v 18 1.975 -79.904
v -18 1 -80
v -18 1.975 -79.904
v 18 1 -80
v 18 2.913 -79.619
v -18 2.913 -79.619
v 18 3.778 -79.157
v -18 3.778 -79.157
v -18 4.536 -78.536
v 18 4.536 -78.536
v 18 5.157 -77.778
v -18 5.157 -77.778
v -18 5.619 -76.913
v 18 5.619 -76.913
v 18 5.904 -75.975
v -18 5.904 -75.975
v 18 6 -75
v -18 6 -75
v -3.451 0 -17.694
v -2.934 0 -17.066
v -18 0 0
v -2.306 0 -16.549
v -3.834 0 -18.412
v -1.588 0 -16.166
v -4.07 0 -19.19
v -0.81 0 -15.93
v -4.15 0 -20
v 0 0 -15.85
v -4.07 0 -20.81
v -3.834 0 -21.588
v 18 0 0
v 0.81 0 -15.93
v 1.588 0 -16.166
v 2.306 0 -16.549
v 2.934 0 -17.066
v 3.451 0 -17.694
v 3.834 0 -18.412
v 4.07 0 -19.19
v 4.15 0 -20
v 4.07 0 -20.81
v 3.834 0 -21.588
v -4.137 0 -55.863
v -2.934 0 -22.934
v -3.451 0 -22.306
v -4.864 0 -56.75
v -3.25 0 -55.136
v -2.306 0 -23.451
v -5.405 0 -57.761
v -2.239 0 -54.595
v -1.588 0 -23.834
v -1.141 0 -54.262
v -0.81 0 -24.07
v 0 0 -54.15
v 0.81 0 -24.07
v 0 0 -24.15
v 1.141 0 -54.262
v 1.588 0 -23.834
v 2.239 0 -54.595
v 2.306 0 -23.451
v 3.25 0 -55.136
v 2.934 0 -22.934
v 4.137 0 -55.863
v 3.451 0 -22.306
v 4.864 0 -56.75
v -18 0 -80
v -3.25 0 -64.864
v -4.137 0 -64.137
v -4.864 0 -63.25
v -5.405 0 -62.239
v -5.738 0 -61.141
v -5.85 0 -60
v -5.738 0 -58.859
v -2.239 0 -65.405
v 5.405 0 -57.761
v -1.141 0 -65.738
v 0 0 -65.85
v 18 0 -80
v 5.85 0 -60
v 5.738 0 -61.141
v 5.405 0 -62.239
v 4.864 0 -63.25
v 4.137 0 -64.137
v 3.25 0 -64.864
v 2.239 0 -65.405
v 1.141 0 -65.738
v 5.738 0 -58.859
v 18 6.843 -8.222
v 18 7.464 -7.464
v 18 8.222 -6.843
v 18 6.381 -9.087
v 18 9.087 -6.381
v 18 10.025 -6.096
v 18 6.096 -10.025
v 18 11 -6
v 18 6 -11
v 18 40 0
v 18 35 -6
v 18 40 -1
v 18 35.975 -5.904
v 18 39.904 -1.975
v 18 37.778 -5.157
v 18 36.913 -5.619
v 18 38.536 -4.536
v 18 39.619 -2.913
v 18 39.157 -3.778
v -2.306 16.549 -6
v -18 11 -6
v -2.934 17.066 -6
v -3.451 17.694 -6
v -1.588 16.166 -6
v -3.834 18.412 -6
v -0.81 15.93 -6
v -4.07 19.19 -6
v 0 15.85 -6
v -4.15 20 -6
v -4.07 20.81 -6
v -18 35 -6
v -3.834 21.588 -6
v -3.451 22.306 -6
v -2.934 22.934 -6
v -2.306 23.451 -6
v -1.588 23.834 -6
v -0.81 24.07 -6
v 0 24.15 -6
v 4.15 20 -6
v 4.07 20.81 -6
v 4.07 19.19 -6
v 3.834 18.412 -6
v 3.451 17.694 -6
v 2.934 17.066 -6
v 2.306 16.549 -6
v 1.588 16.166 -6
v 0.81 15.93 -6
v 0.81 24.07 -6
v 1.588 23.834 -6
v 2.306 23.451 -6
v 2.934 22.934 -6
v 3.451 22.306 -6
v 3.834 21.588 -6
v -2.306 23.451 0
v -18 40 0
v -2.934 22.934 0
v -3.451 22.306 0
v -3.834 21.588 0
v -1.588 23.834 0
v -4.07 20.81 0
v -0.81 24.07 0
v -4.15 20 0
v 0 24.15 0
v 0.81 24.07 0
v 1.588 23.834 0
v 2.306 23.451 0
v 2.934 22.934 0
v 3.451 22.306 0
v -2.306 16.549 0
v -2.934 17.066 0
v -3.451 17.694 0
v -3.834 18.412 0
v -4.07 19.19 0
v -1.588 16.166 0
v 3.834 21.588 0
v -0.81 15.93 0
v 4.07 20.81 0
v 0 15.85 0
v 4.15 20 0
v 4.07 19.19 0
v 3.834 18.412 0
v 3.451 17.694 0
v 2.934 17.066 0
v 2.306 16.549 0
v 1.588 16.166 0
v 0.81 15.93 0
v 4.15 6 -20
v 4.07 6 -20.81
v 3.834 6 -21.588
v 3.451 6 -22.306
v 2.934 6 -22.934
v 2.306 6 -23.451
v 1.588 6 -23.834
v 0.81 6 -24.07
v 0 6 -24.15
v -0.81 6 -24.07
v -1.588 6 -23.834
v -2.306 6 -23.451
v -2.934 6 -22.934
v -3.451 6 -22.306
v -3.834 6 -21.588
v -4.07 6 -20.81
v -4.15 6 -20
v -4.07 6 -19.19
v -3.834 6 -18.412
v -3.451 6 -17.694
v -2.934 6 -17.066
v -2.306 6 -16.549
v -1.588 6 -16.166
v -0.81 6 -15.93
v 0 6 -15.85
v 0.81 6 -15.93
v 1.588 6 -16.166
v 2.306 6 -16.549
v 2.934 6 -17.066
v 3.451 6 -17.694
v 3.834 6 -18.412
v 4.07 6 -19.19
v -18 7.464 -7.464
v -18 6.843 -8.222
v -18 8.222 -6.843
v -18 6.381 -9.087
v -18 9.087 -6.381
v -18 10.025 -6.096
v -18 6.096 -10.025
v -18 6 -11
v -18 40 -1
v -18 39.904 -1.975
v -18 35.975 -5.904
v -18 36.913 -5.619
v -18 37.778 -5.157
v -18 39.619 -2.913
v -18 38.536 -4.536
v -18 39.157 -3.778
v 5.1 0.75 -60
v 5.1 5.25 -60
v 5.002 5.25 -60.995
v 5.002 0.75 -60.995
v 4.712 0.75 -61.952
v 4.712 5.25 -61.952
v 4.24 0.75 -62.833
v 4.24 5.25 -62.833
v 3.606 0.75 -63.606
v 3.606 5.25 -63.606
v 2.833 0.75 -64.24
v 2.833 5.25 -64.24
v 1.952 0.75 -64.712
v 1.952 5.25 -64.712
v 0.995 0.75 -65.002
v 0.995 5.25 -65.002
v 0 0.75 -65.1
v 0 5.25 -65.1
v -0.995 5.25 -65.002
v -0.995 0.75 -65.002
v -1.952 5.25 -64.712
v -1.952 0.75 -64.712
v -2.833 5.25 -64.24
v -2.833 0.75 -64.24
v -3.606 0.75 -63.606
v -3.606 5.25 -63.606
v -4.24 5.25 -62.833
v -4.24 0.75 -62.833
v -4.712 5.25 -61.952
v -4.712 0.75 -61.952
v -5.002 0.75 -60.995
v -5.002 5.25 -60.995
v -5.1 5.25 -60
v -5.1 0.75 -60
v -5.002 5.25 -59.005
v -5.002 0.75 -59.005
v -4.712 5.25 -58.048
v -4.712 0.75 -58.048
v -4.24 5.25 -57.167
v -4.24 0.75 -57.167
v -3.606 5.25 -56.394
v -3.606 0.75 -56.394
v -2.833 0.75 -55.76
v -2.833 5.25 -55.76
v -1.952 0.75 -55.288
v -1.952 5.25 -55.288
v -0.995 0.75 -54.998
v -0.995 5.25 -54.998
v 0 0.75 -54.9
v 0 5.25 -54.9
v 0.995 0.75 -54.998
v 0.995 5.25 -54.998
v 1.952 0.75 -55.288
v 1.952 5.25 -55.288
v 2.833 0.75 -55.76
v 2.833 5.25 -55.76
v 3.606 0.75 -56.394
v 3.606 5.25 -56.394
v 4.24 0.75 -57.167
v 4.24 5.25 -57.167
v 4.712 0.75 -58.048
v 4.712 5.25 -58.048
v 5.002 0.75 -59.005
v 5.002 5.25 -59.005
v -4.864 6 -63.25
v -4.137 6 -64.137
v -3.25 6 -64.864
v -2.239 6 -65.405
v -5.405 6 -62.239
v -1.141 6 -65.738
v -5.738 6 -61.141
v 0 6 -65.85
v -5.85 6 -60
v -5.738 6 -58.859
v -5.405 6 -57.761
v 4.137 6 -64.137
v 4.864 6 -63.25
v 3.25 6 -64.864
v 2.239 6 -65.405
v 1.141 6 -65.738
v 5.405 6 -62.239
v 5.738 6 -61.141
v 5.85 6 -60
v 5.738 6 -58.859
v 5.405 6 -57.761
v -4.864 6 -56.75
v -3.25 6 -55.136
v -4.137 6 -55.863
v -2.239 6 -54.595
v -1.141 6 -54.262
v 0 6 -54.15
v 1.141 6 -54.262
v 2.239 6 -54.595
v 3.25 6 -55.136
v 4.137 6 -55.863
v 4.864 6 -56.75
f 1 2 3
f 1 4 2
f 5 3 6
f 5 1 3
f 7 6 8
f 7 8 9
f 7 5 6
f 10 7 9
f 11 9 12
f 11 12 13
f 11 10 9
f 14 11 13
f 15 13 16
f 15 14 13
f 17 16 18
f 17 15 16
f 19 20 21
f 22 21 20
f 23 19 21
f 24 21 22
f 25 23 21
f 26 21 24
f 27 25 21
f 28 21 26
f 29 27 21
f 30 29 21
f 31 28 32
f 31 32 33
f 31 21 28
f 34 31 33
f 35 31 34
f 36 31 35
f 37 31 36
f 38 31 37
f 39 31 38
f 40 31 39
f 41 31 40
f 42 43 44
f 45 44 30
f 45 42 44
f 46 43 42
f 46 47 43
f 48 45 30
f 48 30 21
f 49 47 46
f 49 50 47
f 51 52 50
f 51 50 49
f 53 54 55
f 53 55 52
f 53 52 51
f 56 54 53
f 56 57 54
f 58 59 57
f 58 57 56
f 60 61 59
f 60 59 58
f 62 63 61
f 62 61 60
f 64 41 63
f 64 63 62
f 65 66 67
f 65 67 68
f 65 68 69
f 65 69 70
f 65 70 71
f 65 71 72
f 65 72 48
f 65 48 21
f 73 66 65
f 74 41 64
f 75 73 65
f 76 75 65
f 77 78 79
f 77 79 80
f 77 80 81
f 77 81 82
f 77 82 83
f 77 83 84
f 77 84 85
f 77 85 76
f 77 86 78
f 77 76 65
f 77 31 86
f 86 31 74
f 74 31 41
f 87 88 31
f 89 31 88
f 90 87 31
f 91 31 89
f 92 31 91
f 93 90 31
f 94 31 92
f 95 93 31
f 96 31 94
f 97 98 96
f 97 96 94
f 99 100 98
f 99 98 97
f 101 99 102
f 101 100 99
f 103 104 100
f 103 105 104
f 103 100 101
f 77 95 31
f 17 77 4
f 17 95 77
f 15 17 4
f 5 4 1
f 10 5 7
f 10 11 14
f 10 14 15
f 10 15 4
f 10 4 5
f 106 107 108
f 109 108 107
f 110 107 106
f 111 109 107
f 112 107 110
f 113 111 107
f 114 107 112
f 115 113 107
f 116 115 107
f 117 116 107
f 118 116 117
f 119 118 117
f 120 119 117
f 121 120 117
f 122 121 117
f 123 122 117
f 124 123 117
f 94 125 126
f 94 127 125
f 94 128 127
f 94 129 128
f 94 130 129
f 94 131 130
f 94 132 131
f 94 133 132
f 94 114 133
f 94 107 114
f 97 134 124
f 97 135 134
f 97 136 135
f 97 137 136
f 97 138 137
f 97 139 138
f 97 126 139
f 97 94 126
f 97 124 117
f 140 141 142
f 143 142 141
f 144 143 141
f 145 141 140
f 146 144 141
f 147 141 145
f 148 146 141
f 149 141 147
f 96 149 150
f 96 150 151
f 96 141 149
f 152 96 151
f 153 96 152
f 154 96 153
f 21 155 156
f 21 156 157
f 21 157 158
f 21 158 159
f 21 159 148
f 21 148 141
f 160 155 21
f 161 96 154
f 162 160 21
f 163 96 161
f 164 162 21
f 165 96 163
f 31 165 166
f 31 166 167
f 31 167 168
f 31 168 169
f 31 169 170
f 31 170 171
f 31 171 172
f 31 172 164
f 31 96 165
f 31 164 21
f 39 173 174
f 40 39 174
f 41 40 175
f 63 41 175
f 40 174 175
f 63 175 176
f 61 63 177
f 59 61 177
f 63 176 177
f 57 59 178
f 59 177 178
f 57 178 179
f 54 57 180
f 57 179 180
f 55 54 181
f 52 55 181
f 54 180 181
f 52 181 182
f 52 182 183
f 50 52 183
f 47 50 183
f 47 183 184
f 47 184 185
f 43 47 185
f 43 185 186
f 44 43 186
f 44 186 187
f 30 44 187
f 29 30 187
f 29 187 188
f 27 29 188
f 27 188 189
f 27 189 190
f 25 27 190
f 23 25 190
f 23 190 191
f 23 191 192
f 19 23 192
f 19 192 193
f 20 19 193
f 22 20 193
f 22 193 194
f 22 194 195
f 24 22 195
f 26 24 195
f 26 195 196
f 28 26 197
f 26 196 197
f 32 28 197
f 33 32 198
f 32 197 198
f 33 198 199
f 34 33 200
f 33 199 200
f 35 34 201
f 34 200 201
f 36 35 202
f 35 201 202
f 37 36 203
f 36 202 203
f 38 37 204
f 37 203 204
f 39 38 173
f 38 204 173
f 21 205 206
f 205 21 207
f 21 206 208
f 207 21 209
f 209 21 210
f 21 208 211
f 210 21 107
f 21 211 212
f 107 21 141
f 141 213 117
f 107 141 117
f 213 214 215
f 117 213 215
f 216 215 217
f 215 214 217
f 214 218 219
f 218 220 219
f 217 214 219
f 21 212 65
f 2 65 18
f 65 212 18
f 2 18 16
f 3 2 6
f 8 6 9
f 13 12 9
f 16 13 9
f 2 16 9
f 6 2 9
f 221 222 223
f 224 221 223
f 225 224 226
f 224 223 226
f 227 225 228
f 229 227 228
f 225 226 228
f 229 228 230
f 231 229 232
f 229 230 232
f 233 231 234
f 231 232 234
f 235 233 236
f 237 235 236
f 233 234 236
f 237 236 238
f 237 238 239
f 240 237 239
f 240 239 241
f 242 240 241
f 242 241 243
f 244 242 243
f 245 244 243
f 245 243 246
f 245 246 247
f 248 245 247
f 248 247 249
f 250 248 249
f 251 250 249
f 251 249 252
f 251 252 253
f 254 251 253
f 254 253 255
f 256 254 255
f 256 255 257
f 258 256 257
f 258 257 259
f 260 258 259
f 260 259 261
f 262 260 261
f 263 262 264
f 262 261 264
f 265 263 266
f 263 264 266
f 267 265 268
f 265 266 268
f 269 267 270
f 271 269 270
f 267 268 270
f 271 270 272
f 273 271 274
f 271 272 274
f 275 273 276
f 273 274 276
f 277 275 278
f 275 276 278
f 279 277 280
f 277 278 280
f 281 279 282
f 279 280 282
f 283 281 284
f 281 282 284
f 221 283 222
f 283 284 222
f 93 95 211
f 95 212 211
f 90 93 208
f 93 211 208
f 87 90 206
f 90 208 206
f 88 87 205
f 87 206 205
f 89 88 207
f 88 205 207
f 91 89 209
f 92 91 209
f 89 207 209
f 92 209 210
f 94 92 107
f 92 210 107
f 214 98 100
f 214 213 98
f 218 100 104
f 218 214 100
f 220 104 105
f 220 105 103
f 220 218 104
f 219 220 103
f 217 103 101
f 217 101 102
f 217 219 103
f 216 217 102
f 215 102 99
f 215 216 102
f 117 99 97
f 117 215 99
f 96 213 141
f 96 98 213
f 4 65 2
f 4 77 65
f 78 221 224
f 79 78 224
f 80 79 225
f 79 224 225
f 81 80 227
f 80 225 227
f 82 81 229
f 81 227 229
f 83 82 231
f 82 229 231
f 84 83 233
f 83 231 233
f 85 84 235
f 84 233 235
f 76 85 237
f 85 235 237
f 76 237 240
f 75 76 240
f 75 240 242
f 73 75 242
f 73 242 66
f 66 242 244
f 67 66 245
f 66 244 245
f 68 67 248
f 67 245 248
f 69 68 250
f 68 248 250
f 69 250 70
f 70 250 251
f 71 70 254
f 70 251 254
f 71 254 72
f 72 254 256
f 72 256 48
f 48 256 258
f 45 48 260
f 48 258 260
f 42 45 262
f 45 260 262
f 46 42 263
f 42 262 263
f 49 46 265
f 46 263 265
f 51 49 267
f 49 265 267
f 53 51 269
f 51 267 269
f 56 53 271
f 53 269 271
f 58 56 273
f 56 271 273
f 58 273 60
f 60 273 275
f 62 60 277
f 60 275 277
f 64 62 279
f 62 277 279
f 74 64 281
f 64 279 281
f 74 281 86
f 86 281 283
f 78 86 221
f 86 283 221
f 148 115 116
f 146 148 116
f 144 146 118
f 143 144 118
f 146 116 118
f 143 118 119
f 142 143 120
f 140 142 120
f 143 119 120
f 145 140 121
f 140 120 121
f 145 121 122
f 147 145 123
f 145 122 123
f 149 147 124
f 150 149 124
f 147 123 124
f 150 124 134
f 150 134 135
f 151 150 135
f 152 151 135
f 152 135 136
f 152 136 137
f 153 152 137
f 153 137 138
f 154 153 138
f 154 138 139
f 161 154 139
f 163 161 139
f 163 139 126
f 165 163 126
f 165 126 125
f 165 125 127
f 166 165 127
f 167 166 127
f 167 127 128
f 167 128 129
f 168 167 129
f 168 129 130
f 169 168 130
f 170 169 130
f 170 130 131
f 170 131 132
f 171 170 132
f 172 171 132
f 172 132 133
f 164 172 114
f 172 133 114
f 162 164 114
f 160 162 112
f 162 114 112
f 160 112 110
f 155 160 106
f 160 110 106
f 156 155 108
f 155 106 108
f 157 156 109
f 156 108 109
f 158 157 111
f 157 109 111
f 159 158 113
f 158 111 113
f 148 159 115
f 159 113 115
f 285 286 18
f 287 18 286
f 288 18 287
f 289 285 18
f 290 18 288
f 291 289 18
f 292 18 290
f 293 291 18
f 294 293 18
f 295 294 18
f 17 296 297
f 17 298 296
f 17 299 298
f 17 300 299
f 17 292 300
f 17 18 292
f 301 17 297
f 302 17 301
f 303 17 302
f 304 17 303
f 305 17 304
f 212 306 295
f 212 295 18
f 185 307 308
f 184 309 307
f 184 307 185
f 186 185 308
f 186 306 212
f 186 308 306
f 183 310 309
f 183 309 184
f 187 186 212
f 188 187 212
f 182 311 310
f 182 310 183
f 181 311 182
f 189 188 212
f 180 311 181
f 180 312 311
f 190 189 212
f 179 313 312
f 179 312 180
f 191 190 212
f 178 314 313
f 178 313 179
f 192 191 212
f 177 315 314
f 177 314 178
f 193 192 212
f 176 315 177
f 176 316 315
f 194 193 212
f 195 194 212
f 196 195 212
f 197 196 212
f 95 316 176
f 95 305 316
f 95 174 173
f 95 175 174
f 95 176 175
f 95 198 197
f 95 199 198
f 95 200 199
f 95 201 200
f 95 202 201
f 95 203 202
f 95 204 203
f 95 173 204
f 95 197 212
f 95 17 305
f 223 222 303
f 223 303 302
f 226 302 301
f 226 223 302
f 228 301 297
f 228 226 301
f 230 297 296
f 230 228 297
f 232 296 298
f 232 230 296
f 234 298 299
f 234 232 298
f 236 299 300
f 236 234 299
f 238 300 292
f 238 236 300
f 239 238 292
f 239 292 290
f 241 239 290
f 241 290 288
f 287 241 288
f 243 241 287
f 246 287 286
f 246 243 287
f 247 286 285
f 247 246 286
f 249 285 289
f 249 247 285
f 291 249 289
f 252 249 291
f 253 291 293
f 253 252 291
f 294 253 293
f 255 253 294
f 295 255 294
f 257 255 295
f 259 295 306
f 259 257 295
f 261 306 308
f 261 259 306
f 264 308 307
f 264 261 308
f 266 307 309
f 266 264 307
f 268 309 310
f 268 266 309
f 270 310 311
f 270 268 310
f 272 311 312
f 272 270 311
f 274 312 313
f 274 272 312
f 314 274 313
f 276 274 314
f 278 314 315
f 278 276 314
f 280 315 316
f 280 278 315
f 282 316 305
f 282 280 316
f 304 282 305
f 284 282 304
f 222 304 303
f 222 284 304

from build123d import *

# Parameters (mm, degrees)
BOSS_EXTRUDE1_DEPTH = 18
SKETCH2_R           = 5.1
SKETCH2_R_2         = 4.15
CUT_EXTRUDE1_DEPTH  = 7
SKETCH3_R           = 4.15
CUT_EXTRUDE2_DEPTH  = 7
FILLET1_R           = 5
CHAMFER1_SIZE       = 0.75


with BuildPart() as part:
    # Sketch1 → Boss-Extrude1 (new body, symmetric)
    with BuildSketch(Plane(origin=(0, 0, 0), x_dir=(0, 0, -1), z_dir=(1, 0, 0))):
        Polygon((0, 40), (0, 0), (80, 0), (80, 6), (6, 6), (6, 40), align=None)
    extrude(amount=BOSS_EXTRUDE1_DEPTH, both=True)

    # Sketch2 → Cut-Extrude1 (cut, through all)
    with BuildSketch(Plane(origin=(0, 6, 0), x_dir=(1, 0, 0), z_dir=(0, 1, 0))):
        with Locations((0, 60)):
            Circle(SKETCH2_R)
        with Locations((0, 20)):
            Circle(SKETCH2_R_2)
    extrude(amount=-CUT_EXTRUDE1_DEPTH, mode=Mode.SUBTRACT)

    # Sketch3 → Cut-Extrude2 (cut, through all)
    with BuildSketch(Plane(origin=(0, 0, -6), x_dir=(-1, 0, 0), z_dir=(0, 0, -1))):
        with Locations((0, 20)):
            Circle(SKETCH3_R)
    extrude(amount=-CUT_EXTRUDE2_DEPTH, mode=Mode.SUBTRACT)

    # Fillet1
    fillet1_edges = [part.edges().sort_by_distance(p)[0] for p in [
        (0, 40, -6),
        (0, 6, -6),
        (0, 6, -80),
    ]]
    fillet(fillet1_edges, radius=FILLET1_R)

    # Chamfer1
    chamfer1_edges = [part.edges().sort_by_distance(p)[0] for p in [
        (-5.1, 0, -60),
        (-5.1, 6, -60),
    ]]
    chamfer(chamfer1_edges, length=CHAMFER1_SIZE)


solid = part.part
